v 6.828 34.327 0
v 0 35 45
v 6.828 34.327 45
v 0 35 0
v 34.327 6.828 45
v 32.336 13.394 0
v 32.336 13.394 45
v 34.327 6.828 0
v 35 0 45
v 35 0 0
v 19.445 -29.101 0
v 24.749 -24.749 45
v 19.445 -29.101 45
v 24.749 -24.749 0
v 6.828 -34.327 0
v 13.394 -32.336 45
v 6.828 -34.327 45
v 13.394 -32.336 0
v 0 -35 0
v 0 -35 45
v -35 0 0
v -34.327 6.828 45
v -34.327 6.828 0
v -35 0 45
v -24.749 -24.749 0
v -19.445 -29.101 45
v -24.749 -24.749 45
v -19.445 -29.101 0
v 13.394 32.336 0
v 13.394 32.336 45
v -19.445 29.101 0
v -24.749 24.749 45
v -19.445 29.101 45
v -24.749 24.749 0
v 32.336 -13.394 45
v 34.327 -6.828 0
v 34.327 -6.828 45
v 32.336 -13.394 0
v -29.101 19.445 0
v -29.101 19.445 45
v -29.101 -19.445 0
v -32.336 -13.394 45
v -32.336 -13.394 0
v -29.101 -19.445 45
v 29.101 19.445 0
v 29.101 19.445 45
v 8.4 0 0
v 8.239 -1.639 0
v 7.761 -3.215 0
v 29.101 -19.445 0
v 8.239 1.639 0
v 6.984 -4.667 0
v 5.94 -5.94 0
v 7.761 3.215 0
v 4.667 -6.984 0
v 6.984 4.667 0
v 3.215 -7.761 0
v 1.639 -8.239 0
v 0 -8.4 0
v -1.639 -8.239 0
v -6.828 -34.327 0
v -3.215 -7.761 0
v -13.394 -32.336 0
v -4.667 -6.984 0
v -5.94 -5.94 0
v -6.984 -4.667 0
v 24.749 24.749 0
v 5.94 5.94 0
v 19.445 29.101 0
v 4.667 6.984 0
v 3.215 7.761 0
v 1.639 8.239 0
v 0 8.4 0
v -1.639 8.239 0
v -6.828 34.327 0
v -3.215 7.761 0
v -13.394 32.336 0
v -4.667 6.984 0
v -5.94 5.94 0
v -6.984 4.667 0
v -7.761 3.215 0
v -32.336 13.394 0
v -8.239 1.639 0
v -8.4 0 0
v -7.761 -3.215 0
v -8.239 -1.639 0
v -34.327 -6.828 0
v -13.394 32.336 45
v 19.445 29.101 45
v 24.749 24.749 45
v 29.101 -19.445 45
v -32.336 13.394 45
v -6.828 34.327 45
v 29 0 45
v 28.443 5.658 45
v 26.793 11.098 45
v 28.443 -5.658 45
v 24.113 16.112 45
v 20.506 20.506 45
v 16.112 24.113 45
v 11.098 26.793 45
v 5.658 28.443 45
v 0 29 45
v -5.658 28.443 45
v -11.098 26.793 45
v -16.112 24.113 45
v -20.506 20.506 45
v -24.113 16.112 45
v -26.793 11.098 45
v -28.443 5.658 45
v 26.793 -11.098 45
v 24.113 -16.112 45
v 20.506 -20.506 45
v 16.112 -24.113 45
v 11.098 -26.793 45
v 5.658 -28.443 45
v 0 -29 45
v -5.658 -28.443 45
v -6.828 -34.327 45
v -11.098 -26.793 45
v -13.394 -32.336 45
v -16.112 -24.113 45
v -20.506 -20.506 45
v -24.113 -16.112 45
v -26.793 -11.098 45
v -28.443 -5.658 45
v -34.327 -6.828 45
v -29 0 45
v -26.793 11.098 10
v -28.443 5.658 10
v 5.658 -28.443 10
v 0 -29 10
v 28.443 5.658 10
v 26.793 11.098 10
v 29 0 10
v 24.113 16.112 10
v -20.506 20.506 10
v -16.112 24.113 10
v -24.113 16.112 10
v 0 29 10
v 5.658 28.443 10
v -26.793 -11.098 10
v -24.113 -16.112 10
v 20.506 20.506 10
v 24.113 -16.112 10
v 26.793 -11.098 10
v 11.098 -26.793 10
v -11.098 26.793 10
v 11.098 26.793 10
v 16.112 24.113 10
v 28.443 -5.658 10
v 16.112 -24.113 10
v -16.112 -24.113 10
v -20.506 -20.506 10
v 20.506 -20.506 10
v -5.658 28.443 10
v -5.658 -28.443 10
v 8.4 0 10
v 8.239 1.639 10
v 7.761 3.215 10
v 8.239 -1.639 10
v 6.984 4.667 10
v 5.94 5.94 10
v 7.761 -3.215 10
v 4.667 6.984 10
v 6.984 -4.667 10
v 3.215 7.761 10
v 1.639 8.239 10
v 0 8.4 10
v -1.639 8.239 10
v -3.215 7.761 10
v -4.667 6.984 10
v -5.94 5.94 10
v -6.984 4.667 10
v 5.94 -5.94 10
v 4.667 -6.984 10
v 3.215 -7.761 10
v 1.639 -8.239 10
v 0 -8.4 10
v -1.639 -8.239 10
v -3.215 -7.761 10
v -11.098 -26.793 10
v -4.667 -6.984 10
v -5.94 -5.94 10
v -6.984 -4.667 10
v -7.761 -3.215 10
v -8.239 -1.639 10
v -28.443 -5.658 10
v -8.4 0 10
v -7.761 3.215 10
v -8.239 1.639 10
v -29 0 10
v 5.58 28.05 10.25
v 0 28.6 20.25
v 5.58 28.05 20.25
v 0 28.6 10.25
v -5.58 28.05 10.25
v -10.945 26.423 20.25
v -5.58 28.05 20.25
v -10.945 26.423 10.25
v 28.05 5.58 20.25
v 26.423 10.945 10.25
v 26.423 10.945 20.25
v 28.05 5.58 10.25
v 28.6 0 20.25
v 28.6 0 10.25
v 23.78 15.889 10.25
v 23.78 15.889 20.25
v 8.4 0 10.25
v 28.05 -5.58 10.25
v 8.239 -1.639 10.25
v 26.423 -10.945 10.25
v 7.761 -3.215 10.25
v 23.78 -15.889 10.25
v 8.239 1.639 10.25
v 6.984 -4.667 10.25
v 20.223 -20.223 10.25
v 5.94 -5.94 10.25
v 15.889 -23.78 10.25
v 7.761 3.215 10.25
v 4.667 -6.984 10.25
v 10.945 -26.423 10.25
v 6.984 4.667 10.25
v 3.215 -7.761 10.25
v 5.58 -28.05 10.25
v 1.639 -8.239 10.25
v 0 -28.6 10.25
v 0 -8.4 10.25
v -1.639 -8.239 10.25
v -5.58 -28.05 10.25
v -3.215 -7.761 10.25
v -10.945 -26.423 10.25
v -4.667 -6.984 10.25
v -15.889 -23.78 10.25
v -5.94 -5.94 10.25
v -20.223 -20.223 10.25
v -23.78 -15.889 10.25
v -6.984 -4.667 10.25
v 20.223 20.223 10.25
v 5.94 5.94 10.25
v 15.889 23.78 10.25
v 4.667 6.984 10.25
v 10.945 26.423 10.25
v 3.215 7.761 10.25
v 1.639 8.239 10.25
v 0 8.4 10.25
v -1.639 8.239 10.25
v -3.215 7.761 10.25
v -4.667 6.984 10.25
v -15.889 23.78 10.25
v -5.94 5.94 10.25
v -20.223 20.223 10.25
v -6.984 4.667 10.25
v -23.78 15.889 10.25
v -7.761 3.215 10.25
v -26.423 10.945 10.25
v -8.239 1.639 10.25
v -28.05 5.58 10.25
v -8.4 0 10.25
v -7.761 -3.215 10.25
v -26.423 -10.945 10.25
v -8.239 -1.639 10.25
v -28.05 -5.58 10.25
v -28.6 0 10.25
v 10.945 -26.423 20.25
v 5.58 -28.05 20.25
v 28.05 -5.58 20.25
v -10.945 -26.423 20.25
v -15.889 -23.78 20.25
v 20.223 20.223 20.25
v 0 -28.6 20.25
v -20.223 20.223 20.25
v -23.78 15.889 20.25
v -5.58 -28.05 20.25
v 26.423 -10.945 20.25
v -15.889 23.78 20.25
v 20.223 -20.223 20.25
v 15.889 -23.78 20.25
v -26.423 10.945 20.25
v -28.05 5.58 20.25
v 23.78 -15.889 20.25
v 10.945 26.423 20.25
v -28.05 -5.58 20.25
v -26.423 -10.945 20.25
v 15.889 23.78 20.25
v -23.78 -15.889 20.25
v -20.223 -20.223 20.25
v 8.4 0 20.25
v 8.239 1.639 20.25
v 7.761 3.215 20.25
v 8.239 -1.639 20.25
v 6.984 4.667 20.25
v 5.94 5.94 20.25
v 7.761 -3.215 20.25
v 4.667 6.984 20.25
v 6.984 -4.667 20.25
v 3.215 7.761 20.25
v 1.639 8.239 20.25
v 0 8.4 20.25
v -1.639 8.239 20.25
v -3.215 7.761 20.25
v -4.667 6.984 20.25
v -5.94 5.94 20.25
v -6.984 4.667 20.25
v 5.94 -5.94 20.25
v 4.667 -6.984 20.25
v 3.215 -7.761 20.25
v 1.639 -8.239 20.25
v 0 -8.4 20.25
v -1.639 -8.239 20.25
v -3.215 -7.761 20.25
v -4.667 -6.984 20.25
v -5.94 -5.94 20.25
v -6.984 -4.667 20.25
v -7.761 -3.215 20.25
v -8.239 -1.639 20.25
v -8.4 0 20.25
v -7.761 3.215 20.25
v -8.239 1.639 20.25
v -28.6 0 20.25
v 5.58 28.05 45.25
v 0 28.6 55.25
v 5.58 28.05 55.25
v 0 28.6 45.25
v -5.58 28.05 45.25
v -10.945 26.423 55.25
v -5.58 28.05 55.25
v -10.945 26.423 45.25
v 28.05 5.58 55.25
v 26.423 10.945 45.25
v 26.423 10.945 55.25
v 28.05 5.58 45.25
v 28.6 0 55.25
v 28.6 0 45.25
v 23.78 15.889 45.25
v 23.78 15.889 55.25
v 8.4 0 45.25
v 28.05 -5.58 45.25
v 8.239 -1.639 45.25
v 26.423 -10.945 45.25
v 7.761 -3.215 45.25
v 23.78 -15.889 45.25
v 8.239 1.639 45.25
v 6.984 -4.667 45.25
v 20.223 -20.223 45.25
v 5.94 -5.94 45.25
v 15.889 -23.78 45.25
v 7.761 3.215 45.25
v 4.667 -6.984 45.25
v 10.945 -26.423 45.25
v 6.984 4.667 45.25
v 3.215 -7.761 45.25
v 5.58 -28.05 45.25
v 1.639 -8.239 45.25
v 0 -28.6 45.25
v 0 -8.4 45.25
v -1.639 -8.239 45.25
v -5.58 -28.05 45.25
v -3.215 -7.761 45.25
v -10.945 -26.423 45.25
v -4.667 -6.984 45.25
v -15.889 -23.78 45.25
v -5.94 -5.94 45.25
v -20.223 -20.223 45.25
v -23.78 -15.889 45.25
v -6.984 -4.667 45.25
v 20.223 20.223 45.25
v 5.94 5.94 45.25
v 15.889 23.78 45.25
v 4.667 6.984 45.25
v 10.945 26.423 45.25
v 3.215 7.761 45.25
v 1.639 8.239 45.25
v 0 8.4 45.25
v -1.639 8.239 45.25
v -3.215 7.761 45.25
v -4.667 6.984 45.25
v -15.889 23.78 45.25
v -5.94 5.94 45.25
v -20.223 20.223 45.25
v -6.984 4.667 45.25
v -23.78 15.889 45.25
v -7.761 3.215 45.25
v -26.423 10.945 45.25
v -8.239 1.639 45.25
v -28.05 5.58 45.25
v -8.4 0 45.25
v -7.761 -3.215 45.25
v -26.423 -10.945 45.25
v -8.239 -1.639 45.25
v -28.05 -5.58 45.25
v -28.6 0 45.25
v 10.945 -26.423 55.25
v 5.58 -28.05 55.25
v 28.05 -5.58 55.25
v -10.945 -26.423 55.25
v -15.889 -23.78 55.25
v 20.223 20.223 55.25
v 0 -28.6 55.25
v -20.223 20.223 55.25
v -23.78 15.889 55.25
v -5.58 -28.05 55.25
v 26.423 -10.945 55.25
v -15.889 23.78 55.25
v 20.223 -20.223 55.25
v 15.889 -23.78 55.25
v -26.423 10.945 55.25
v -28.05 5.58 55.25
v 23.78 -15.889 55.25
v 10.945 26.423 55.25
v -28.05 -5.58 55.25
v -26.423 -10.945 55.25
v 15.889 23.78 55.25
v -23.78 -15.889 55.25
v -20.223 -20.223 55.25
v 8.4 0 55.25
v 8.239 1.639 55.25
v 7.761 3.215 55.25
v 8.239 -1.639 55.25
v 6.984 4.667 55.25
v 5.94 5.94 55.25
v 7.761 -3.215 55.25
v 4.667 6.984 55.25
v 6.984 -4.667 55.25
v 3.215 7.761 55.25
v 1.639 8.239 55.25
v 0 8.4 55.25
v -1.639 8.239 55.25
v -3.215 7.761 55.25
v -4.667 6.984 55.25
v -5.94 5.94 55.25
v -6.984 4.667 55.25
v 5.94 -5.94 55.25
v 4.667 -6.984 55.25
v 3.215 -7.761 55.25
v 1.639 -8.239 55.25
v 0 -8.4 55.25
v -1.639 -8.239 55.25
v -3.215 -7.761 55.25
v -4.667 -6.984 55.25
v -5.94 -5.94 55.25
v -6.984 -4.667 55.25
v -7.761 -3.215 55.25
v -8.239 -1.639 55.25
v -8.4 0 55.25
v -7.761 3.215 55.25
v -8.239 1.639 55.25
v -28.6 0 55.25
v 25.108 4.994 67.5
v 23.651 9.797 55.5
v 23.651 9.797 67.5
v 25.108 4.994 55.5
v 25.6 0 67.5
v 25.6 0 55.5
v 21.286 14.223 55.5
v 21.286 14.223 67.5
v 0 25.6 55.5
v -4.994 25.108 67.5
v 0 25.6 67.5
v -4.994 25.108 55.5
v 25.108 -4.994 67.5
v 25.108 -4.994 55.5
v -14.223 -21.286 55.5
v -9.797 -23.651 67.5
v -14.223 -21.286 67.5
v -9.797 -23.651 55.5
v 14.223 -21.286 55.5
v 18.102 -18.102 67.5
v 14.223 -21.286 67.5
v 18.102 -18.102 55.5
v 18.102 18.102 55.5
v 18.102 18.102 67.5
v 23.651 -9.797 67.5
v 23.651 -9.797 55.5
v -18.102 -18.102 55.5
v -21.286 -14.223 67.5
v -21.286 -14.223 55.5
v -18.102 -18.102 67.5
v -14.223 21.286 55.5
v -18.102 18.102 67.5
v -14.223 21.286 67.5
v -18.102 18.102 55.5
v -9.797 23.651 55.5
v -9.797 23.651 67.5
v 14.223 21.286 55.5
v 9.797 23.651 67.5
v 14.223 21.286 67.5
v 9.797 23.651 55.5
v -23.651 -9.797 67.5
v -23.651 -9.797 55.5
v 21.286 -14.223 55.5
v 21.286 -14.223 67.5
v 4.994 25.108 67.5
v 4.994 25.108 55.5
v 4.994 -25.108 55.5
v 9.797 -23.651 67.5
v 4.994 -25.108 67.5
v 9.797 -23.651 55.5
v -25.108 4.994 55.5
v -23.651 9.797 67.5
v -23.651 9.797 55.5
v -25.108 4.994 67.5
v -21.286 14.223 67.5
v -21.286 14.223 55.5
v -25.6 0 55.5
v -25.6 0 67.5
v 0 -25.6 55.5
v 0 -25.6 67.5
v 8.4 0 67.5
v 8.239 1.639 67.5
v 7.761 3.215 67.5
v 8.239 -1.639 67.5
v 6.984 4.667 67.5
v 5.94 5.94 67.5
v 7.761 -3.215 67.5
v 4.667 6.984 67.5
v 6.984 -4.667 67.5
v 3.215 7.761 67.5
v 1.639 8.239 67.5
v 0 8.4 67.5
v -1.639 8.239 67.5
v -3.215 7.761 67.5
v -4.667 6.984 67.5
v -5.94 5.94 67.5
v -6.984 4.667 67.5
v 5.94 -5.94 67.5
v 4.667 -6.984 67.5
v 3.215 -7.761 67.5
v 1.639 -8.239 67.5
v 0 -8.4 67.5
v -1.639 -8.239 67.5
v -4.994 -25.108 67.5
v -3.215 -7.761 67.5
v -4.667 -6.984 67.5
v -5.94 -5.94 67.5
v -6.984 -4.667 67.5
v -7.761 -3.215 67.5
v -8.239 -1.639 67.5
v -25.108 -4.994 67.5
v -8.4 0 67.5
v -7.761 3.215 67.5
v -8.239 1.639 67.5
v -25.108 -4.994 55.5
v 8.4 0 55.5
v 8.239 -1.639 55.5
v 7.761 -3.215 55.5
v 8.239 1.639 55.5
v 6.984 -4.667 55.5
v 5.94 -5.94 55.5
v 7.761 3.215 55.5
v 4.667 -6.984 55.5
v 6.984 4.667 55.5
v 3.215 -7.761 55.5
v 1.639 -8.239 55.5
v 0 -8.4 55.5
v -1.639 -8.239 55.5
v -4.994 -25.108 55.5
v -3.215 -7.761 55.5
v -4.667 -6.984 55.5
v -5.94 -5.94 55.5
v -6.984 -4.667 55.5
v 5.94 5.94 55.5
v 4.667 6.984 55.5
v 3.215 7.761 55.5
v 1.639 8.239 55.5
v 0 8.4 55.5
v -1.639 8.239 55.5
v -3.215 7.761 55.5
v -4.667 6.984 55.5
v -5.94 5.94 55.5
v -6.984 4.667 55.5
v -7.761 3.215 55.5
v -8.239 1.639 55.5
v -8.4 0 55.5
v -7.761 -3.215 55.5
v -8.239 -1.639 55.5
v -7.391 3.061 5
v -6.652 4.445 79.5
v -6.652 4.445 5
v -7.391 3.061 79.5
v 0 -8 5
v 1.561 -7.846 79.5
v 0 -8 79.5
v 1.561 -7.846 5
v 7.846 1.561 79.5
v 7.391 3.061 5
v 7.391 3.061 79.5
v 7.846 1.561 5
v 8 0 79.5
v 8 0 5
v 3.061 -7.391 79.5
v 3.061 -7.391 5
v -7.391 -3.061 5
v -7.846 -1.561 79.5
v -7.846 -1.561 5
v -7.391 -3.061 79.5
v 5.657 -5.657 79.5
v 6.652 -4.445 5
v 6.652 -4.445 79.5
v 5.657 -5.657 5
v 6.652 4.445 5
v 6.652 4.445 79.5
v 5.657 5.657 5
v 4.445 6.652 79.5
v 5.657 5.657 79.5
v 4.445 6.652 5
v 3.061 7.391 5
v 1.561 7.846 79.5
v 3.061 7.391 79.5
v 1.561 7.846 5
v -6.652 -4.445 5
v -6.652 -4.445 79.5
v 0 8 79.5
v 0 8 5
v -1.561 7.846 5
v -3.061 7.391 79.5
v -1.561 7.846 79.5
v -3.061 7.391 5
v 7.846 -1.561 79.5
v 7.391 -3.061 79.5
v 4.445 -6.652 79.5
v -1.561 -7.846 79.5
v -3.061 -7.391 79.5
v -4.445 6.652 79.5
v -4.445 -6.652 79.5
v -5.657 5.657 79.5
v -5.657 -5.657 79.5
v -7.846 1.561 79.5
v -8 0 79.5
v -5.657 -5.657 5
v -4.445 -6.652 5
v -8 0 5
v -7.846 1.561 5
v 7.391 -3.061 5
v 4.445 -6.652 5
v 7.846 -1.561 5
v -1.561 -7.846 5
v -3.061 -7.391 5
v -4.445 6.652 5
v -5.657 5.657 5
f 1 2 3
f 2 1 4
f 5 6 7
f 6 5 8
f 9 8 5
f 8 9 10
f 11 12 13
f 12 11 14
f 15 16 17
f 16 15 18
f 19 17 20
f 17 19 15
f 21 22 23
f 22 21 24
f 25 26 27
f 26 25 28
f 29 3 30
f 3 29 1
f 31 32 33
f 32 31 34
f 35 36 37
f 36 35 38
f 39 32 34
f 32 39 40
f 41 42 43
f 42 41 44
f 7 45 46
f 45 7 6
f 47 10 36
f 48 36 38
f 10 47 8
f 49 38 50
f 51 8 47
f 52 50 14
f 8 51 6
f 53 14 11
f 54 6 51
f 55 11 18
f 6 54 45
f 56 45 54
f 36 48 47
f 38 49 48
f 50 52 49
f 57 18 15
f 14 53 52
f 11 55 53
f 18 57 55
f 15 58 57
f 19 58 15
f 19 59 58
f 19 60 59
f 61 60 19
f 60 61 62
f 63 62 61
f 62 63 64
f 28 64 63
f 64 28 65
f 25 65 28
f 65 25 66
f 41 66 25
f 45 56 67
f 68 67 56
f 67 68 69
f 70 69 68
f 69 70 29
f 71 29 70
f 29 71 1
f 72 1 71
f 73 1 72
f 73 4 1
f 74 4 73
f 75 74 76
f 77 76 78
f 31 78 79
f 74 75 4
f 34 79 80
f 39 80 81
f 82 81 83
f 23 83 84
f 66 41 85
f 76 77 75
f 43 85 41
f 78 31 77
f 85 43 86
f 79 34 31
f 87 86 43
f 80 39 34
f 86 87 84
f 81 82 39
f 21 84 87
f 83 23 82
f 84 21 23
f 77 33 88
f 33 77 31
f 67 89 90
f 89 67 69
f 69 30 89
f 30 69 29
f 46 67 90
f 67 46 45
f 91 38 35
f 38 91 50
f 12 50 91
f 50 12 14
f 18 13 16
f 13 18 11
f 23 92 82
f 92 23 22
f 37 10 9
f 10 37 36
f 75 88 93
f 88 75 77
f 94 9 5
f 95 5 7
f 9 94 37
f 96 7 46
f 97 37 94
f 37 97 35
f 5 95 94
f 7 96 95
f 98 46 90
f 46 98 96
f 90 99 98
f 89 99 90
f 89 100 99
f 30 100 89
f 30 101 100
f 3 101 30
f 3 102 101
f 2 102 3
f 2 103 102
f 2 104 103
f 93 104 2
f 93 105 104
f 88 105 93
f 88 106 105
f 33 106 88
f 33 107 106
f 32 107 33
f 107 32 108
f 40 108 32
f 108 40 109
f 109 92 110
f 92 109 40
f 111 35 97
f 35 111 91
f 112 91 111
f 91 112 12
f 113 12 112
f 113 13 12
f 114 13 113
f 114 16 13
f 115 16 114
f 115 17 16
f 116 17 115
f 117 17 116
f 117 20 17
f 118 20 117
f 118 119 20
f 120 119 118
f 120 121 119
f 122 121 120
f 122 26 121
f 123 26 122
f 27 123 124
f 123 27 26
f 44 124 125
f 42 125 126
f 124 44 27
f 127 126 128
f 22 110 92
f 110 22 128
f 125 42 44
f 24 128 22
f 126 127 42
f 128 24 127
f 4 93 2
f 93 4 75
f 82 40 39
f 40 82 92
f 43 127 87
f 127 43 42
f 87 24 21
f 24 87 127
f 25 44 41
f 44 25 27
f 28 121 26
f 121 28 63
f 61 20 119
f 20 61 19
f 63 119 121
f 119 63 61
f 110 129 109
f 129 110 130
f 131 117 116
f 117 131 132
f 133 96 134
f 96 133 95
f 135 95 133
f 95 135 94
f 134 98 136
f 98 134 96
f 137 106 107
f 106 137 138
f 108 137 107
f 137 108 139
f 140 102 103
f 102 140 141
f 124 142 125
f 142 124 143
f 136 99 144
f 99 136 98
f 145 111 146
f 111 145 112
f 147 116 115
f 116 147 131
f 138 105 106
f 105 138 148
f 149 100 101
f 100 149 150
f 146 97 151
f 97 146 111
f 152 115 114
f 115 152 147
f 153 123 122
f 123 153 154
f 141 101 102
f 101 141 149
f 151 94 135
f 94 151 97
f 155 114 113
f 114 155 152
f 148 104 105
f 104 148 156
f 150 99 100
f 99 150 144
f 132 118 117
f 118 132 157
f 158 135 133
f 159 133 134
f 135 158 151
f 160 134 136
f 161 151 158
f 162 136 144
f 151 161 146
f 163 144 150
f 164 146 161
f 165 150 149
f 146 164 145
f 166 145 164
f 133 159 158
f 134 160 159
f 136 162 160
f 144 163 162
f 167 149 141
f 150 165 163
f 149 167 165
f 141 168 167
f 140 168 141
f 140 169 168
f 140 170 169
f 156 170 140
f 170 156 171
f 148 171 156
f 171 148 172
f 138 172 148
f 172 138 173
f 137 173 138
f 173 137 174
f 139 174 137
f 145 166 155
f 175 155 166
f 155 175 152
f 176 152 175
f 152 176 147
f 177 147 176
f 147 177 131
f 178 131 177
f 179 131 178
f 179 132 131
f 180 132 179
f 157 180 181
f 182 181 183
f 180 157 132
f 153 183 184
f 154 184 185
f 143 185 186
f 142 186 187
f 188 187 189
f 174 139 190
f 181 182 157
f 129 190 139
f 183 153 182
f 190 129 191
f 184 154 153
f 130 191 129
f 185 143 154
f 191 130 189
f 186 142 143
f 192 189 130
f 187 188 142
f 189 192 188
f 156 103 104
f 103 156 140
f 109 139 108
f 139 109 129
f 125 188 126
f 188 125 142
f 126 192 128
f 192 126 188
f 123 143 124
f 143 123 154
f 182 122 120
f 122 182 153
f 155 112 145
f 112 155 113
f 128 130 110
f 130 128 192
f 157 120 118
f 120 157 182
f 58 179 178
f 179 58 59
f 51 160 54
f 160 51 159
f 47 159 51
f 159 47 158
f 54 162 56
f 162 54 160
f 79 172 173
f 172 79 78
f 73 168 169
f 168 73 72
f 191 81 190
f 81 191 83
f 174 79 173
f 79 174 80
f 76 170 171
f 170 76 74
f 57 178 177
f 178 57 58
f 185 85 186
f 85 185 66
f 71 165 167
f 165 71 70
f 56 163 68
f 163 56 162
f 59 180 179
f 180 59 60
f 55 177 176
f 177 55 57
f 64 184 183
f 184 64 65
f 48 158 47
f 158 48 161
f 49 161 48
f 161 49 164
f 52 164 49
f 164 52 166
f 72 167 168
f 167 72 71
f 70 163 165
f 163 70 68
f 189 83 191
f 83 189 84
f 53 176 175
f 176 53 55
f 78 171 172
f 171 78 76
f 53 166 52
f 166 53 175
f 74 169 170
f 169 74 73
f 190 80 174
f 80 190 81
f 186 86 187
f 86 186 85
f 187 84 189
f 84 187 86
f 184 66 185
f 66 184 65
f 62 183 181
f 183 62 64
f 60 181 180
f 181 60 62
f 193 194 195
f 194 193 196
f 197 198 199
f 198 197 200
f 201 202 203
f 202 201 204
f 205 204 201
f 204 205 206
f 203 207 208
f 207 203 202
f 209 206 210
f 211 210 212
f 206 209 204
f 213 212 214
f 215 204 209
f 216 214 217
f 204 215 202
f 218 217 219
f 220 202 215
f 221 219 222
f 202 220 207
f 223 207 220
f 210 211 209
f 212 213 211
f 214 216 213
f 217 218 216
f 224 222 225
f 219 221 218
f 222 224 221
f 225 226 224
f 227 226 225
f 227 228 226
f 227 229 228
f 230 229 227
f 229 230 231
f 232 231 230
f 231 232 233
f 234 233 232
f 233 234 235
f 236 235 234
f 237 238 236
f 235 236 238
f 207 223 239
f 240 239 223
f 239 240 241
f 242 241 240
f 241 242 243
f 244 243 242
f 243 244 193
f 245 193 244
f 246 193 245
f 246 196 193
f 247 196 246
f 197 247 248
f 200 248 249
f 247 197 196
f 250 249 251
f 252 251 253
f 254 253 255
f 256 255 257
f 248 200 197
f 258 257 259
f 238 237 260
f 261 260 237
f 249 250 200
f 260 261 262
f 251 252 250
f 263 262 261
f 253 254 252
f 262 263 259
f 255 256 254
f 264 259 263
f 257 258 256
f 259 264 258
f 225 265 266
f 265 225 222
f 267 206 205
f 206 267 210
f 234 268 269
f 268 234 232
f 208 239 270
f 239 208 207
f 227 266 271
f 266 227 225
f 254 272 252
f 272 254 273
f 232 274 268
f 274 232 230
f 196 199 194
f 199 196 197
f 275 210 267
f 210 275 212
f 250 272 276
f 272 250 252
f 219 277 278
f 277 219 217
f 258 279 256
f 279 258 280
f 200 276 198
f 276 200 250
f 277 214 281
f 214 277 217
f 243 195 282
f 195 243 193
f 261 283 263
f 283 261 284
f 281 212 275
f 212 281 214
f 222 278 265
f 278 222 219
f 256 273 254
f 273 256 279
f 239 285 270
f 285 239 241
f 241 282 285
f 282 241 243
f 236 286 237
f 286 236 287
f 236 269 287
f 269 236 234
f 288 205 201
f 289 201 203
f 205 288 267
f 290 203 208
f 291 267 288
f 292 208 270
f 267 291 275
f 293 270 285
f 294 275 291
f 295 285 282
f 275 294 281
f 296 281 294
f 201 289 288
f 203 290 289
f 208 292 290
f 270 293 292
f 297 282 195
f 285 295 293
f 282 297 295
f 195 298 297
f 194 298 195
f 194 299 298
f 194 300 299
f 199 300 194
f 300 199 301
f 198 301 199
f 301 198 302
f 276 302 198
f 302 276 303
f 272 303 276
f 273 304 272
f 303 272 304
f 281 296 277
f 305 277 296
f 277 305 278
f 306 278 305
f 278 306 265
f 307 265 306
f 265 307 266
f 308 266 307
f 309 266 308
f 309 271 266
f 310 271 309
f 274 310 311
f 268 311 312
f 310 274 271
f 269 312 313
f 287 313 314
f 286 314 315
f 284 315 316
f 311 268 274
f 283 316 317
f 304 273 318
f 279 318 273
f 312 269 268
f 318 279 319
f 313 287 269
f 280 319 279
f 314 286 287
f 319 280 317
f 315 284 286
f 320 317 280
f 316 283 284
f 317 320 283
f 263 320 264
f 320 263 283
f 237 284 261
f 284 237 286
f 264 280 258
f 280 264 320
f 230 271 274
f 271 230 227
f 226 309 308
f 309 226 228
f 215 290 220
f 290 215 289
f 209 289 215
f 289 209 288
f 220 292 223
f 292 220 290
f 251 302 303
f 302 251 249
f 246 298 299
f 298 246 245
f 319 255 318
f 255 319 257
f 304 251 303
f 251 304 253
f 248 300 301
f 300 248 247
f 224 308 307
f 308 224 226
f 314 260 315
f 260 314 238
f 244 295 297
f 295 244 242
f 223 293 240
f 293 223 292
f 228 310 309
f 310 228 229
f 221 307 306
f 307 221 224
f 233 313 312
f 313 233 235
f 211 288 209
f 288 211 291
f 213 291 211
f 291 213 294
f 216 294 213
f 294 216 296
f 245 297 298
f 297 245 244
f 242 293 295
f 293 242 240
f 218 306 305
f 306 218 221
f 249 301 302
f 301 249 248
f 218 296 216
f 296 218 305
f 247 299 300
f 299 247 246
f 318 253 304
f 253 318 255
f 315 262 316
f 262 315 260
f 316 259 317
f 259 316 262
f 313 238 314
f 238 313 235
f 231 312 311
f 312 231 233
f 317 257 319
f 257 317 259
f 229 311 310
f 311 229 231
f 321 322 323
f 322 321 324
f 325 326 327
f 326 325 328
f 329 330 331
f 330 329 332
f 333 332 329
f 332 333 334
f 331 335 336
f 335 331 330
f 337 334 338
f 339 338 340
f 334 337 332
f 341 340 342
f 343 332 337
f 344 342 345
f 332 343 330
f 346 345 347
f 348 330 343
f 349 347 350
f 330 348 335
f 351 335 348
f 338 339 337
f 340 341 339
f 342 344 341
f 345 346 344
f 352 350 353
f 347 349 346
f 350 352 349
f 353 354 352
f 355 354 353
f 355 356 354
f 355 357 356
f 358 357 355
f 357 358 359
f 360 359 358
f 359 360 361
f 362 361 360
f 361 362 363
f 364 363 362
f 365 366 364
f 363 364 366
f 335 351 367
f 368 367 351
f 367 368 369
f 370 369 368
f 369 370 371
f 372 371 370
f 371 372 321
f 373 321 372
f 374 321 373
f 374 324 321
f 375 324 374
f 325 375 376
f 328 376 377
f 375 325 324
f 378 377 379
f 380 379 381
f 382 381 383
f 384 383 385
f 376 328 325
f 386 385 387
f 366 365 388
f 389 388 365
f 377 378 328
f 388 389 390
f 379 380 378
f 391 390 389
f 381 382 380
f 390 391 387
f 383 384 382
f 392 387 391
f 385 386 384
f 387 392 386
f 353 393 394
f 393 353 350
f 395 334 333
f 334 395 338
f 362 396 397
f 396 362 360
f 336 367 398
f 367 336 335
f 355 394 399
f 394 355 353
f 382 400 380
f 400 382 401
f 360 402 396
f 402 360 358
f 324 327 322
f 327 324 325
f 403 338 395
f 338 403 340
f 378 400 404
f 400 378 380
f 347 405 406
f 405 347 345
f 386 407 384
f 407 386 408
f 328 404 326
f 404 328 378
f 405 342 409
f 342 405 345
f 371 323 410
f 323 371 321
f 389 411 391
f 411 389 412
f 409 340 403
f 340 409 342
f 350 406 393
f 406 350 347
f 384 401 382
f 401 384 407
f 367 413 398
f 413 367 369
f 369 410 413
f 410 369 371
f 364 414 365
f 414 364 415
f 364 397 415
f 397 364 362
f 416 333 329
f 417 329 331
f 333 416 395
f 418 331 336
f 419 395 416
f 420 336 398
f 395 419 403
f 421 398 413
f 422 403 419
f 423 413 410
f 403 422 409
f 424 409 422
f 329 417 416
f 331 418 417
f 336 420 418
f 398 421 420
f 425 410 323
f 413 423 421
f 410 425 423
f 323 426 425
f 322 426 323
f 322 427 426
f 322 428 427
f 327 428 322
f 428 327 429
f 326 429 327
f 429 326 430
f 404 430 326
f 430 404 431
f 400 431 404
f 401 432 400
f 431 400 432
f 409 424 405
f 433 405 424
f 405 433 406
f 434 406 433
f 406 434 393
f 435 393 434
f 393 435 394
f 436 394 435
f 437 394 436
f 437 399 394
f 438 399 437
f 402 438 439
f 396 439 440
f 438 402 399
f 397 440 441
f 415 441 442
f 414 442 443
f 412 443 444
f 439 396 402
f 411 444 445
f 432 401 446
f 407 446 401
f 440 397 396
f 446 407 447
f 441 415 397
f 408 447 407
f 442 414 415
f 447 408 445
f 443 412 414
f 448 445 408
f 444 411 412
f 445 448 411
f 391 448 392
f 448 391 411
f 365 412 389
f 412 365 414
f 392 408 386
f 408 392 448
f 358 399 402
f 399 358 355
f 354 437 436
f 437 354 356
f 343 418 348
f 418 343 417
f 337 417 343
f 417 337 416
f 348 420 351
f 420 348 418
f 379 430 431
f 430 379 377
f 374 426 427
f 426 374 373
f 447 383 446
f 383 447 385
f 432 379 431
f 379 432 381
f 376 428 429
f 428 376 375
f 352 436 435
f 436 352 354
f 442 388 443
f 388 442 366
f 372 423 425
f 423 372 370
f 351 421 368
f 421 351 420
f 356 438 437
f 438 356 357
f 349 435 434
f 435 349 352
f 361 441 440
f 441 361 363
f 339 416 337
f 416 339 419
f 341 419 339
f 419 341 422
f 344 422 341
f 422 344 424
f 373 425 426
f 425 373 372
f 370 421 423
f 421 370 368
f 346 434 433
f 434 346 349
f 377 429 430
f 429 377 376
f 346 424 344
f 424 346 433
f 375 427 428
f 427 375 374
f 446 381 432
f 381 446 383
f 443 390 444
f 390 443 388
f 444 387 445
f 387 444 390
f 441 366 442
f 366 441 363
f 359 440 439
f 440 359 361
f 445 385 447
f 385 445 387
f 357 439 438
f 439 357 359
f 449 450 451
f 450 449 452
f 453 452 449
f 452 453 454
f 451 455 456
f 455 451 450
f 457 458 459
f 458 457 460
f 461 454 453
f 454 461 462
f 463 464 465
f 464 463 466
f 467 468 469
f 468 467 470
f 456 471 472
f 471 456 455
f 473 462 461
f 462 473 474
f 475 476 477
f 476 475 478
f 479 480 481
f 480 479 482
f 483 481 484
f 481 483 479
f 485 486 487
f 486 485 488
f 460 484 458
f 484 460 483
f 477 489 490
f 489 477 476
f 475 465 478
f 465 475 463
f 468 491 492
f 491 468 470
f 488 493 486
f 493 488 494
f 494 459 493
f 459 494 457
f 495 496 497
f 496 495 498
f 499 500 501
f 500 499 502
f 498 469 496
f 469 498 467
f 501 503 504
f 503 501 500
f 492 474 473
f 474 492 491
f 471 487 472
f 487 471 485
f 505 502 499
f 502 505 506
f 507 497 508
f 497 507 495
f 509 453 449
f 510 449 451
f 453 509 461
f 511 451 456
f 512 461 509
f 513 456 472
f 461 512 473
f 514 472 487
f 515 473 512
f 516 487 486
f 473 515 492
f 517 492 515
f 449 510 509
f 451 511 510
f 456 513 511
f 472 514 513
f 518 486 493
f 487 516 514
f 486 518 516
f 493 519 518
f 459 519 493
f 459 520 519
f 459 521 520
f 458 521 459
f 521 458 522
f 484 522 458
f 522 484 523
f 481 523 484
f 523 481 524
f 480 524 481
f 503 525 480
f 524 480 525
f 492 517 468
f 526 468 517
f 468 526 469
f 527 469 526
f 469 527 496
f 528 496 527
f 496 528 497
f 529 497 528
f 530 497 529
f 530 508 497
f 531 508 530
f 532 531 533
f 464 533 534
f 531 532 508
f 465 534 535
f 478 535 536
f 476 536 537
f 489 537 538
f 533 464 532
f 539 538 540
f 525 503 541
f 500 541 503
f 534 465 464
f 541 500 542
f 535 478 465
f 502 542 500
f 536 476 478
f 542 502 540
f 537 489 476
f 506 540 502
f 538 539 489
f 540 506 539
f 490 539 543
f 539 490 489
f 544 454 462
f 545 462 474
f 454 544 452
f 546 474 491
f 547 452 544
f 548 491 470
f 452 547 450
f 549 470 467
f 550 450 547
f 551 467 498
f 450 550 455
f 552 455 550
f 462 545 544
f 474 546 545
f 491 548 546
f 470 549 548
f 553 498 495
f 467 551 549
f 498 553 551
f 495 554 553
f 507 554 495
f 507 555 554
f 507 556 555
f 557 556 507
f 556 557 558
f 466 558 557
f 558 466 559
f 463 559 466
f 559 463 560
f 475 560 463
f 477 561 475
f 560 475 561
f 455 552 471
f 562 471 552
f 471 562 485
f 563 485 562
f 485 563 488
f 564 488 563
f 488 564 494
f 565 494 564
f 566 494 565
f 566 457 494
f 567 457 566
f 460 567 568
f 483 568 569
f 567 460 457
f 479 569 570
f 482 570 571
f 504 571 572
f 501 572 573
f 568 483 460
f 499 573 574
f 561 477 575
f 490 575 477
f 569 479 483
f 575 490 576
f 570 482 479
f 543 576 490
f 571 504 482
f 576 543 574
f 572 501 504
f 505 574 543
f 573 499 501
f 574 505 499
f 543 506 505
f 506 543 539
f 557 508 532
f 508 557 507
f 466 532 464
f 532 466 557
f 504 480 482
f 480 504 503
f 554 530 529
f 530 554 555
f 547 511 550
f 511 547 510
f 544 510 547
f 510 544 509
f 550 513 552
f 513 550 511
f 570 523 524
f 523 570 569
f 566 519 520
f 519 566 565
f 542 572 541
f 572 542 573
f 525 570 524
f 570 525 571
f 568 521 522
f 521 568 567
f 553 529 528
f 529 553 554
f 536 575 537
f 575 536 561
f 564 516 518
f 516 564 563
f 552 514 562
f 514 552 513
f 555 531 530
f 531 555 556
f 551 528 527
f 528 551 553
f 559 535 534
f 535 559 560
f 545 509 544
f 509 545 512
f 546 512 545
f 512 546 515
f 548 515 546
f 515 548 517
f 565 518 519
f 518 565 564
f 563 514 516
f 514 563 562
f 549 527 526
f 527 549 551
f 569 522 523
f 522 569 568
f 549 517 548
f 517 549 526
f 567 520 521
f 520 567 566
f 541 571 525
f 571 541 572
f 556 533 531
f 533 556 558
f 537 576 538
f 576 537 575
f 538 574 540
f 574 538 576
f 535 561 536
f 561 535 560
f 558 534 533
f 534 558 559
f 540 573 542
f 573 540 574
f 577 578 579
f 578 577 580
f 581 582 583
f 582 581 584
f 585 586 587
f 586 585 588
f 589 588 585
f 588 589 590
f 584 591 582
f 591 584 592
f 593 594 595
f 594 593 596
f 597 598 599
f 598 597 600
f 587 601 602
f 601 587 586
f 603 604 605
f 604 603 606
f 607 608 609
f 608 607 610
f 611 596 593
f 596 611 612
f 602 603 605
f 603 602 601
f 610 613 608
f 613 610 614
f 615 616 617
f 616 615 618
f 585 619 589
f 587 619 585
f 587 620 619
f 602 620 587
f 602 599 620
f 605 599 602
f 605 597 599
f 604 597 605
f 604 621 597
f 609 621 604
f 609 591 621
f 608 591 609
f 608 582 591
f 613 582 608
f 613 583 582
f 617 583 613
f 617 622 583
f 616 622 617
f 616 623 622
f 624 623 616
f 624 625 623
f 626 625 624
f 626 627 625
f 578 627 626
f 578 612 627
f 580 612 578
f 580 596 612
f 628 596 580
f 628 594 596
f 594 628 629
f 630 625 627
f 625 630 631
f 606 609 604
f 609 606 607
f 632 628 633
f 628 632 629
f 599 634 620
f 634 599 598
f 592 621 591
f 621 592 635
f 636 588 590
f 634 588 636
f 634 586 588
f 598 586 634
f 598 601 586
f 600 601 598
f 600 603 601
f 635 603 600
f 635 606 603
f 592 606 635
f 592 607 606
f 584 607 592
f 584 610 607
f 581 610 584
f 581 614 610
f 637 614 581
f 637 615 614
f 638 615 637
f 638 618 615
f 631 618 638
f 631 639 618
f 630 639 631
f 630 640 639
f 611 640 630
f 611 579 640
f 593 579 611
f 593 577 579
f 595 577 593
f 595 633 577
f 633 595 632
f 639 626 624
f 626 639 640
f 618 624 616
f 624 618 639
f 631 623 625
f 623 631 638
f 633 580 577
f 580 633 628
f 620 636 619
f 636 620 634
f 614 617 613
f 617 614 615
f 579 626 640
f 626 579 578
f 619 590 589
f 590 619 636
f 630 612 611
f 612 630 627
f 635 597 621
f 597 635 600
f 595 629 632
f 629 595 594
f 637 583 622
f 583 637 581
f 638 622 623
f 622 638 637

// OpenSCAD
$fn = 32;

// ------------------------------------------------------------------------
// Bearing housing: housing d70, two bearings and a shaft
// Every part is its own module, assembly() places them once.
// ------------------------------------------------------------------------

// --- part 1 ---
module housing() {
  difference() {
    cylinder(h = 45, d = 70);
    translate([0, 0, 10]) cylinder(h = 36, d = 58);
    translate([0, 0, -1]) cylinder(h = 12, d = 16.8);
  }
}

// --- part 2 ---
module bearing_lower() {
  difference() {
      translate([0, 0, 0]) cylinder(h = 10, d = 57.2);
      translate([0, 0, -1]) cylinder(h = 12, d = 16.8);
    }
}

// --- part 3 ---
module bearing_upper() {
  difference() {
      translate([0, 0, 0]) cylinder(h = 10, d = 57.2);
      translate([0, 0, -1]) cylinder(h = 12, d = 16.8);
    }
}

// --- part 4 ---
module spacer() {
  difference() {
      translate([0, 0, 0]) cylinder(h = 12, d = 51.2);
      translate([0, 0, -1]) cylinder(h = 14, d = 16.8);
    }
}

// --- part 5 ---
module shaft() {
  translate([0, 0, -37.25]) cylinder(h = 74.5, d = 16);
}

// --- assembly ---
module assembly() {
  translate([0, 0, 0]) rotate([0, 0, 0]) housing();
  translate([0, 0, 10.25]) rotate([0, 0, 0]) bearing_lower();
  translate([0, 0, 45.25]) rotate([0, 0, 0]) bearing_upper();
  translate([0, 0, 55.5]) rotate([0, 0, 0]) spacer();
  translate([0, 0, 42.25]) rotate([0, 0, 0]) shaft();
}

assembly();
